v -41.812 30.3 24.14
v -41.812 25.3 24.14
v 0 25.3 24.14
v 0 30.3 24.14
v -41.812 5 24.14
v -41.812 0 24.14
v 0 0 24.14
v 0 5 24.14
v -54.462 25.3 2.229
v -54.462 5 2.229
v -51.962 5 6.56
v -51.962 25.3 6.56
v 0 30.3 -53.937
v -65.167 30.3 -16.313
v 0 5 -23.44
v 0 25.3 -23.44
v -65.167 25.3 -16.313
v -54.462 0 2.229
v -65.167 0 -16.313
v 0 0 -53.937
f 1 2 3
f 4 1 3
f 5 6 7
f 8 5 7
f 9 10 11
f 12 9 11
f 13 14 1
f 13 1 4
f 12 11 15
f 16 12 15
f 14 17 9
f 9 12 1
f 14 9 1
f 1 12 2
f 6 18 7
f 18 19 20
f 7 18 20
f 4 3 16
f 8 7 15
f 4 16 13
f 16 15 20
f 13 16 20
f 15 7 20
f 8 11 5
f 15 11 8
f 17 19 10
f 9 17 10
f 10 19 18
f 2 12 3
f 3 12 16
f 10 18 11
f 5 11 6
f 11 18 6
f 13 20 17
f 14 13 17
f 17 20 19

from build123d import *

# Parameters (mm, degrees)
BOSS_EXTRUDE2_DEPTH = 5
BOSS_EXTRUDE3_DEPTH = 20.3
BOSS_EXTRUDE4_DEPTH = 5


with BuildPart() as part:
    # Sketch3 → Boss-Extrude2 (new body)
    with BuildSketch(Plane(origin=(0, 0, 0), x_dir=(1, 0, 0), z_dir=(0, 1, 0))):
        Polygon((-54.461524227, -2.229452052), (-41.811524227, -24.139894768), (0, -24.139894768), (0, 29.213923621), (0, 53.936652846), (-65.166780007, 16.312594867), align=None)
    extrude(amount=BOSS_EXTRUDE2_DEPTH)

    # Sketch4 → Boss-Extrude3 (add)
    with BuildSketch(Plane(origin=(0, 5, 0), x_dir=(1, 0, 0), z_dir=(0, 1, 0))):
        Polygon((-51.961524227, -6.559579071), (0, 23.440420929), (0, 29.213923621), (0, 53.936652846), (-65.166780007, 16.312594867), (-54.461524227, -2.229452052), align=None)
    extrude(amount=BOSS_EXTRUDE3_DEPTH)

    # Sketch5 → Boss-Extrude4 (add)
    with BuildSketch(Plane(origin=(0, 25.3, 0), x_dir=(1, 0, 0), z_dir=(0, 1, 0))):
        Polygon((-65.166780007, 16.312594867), (-41.811524227, -24.139894768), (0, -24.139894768), (0, 53.936652846), align=None)
    extrude(amount=BOSS_EXTRUDE4_DEPTH)


solid = part.part
